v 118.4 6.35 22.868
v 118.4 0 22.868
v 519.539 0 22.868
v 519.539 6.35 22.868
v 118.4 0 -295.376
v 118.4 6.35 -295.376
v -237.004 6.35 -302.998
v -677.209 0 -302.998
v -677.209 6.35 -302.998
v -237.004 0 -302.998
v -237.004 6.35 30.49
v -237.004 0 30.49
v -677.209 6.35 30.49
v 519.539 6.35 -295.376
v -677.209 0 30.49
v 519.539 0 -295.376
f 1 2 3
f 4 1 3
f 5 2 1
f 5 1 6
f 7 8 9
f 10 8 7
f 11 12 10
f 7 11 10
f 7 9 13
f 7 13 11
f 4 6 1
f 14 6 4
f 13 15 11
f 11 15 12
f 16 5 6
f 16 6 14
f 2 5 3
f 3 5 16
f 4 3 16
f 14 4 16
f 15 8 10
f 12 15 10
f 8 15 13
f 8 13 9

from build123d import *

# Parameters (mm, degrees)
SKETCH1_W             = 401.139240224
SKETCH1_H             = 318.243482743
BOSS_EXTRUDE1_DEPTH   = 6.35
SKETCH1_W_2           = 440.205056968
SKETCH1_H_2           = 333.488679521
BOSS_EXTRUDE1_2_DEPTH = 6.35


with BuildPart() as part:
    # Sketch1 → Boss-Extrude1 (new body)
    with BuildSketch(Plane(origin=(0, 0, 0), x_dir=(1, 0, 0), z_dir=(0, 1, 0))):
        with Locations((318.96934742, 136.253946205)):
            Rectangle(SKETCH1_W, SKETCH1_H)
    extrude(amount=BOSS_EXTRUDE1_DEPTH)


with BuildPart() as body_2:
    # Sketch1 → Boss-Extrude1 2 (new body)
    with BuildSketch(Plane(origin=(0, 0, 0), x_dir=(1, 0, 0), z_dir=(0, 1, 0))):
        with Locations((-457.106451065, 136.253946205)):
            Rectangle(SKETCH1_W_2, SKETCH1_H_2)
    extrude(amount=BOSS_EXTRUDE1_2_DEPTH)


solid = Compound([part.part, body_2.part])
